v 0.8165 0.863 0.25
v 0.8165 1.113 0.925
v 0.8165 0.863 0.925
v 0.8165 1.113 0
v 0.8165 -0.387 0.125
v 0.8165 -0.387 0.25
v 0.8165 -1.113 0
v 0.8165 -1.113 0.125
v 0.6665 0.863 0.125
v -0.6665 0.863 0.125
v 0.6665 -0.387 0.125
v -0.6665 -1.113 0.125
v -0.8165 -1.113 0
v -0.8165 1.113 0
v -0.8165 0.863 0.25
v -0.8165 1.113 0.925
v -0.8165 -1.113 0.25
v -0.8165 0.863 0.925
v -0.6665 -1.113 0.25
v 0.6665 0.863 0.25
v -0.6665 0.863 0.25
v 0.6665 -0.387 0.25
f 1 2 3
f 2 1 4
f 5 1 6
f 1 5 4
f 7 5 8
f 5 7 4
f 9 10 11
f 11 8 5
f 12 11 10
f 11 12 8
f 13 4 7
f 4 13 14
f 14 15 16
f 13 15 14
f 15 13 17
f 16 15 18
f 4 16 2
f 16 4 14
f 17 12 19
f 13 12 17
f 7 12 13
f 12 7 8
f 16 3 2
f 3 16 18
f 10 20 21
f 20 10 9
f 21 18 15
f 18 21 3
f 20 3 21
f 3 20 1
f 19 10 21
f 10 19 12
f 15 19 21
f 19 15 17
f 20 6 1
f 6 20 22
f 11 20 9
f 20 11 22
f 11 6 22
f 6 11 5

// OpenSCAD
NUM_FACES = 100;
// Value added or subtracted where applicable to get the preview planes to not
//  be inderterminate. 
RESOLVER = 0.0001;

// Idea is to have a sled for the MCU breakout board housing and positioning 
//  (for the USB port in particular) which is joined (preferably in a single
//  print rather than after the fact but this is negotiable) to the portion of
//  the apartus that sits inside the tube (housing the battery and at the front
//  the color sensor).
// Simplest way to design this is in two major parts, one to hold the MCU 
//  breakout and another to sit inside the tube. 
//
// Tube Dimensions:
//  ID: 1.315"
//
// C-Channel Dimensions:
//  Haven't settled on using the C-Channel, but we still have the space to do so
//      if desired so unless we have a reason not to it's best to keep on with
//      the idea that we may still use it.
//  Inner Depth:  1.875"
//  Inner Width:  ~1.750-1.9", varies considerably.
//  Length:       variable

mcu_housing();
//tube_insert();

module mcu_housing(){
// Dimensions for the front wall piece, the part that doesn't sit under the 
//  board and provides the attachment wall for the tube insert piece.
front_attach_wall_len = 0.250;

// Dimensions for the base, which is basically just a platform that everything
//  else rests on top of.
base_width = 1.633; // Matched to the width of the MCU breakout PCB.
base_len = 1.976 + front_attach_wall_len;
base_height = 0.125;

// Front attach wall dimensions continued.
front_attach_wall_width = base_width;
// ~0.925 from bottom of base plate to the top of the tube insert.
front_attach_wall_height = 0.925-base_height;

// Height of the breakout PCB supporting platforms.
support_platform_height = 0.250 - base_height;

// Side support platform dimensions. This is the portion of the aparatus that
//  sits underneath the side of the breakout PCB with the mounting holes in it.
mnt_side_support_platform_width = 0.150;
mnt_side_support_platform_len = base_len;

// Side support platform dimensions. This is the portion of the aparatus that
//  is opposite the breakout PCB mounting holes.
side_support_platform_width = 0.150;
side_support_platform_len = 1.250;

// Base plate.
translate([-base_width/2, -base_len/2, 0])
    cube([base_width, base_len, base_height]);

// Front attachment wall.
translate([
    -front_attach_wall_width/2, 
    base_len/2-front_attach_wall_len, 
    base_height
])
    cube([
        front_attach_wall_width, 
        front_attach_wall_len, 
        front_attach_wall_height
    ]);

// Mounting hole side support platform.
translate([-base_width/2, -mnt_side_support_platform_len/2, base_height])
    cube([
        mnt_side_support_platform_width, 
        mnt_side_support_platform_len, 
        support_platform_height
    ]);

// Non-mounting hole side support platform.
translate([
    base_width/2-side_support_platform_width, 
    -side_support_platform_len+base_len/2-front_attach_wall_len, 
    base_height
])
    cube([
        side_support_platform_width, 
        side_support_platform_len, 
        support_platform_height
    ]);
}

module tube_insert(){
// Need a cylidrical recess for the battery to sit in.
// Needs a face on it for mounting the color sensor breakout PCB on.
//  This needs a hollowed out middle for passing the JST connector through with
//      the in/out wiring running down the rest of the length.

// Battery:
//  ~2.545 from edge to edge, ~2.65" where the wire leads stick out.
//  0.716" at the largest point I can find.
//
// 3.5" from back of tube (assumed back of battery as well) to the back of the
//  color sensor. Tube end extends beyond this but this model doesn't need to
//  worry about that. 

// Main Body params:
len = 3.5;
rad = 1.310 / 2;

// Battery cutout params:
bat_recess_len = 2.7;
bat_recess_rad = 0.75 / 2;

// Color sensor params:
//  These params assume the color sensor is installed such that the JST 
//      connector has it's longest side parrallel to the ground. The JST 
//      connector is positioned off-center, so this also assumes the largest gap
//      between connector and PCB edge is 'down' i.e. in the same direction as
//      the battery recess cutout is. This is ~0.6" from the 'bottom' of the PCB
// These params concern the JST connector specifically, not exact dimensions of
//  it but the space needed for the cutout.
clr_sns_conn_cutout_cut_h = 0.4; // From OD to start of cut.
clr_sns_conn_cutout_w = 0.75; // 0.95" is the width of the breakout.
clr_sns_conn_cutout_h = 0.6; // Height of the actual cut.
clr_sns_conn_cutout_d = len-bat_recess_len; // How deep the clr sns cut is.

// To position the JST cutout we can translate from the Y+ extrema, move up at
//  least 0.6" (to reach bottom of JST ~exactly), and start the 'bottom' of the
//  cut there.
//  Best method for this would be to center the cut over the center of the JST
//      connector but idk how feasible this is with how weird these dimensions
//      are.
//  The cut needs to start before 0.6", this is easy, needs to end no shorter 
//      than 0.825" from there. We can oversize this, we will just use the other
//      dimensions to mount the PCB.

difference(){
        // Main body
        difference(){
            cylinder(h = len, r = rad, $fn=NUM_FACES);
    
            // Cuts off the top half of the housing, overtop the battery only,
            //  this makes it easier to size things and leaves room for wires
            //  w/o too much effort.
            translate([-rad, -rad, -RESOLVER]) 
                cube([rad*2, rad, bat_recess_len]);
        }// End diff

        //Battery recess cutout.
        translate([0, 0, -RESOLVER])
            cylinder(h = bat_recess_len, r = bat_recess_rad, $fn=NUM_FACES);

        // Color sensor wiring connector passthrough cutout.
        translate([
            -clr_sns_conn_cutout_w/2, 
            rad-clr_sns_conn_cutout_h-clr_sns_conn_cutout_cut_h, 
            len-clr_sns_conn_cutout_d-RESOLVER*2])
        cube([
            clr_sns_conn_cutout_w, 
            clr_sns_conn_cutout_h, 
            clr_sns_conn_cutout_d+RESOLVER*3]
        );
    }// End diff
}// End fcn
